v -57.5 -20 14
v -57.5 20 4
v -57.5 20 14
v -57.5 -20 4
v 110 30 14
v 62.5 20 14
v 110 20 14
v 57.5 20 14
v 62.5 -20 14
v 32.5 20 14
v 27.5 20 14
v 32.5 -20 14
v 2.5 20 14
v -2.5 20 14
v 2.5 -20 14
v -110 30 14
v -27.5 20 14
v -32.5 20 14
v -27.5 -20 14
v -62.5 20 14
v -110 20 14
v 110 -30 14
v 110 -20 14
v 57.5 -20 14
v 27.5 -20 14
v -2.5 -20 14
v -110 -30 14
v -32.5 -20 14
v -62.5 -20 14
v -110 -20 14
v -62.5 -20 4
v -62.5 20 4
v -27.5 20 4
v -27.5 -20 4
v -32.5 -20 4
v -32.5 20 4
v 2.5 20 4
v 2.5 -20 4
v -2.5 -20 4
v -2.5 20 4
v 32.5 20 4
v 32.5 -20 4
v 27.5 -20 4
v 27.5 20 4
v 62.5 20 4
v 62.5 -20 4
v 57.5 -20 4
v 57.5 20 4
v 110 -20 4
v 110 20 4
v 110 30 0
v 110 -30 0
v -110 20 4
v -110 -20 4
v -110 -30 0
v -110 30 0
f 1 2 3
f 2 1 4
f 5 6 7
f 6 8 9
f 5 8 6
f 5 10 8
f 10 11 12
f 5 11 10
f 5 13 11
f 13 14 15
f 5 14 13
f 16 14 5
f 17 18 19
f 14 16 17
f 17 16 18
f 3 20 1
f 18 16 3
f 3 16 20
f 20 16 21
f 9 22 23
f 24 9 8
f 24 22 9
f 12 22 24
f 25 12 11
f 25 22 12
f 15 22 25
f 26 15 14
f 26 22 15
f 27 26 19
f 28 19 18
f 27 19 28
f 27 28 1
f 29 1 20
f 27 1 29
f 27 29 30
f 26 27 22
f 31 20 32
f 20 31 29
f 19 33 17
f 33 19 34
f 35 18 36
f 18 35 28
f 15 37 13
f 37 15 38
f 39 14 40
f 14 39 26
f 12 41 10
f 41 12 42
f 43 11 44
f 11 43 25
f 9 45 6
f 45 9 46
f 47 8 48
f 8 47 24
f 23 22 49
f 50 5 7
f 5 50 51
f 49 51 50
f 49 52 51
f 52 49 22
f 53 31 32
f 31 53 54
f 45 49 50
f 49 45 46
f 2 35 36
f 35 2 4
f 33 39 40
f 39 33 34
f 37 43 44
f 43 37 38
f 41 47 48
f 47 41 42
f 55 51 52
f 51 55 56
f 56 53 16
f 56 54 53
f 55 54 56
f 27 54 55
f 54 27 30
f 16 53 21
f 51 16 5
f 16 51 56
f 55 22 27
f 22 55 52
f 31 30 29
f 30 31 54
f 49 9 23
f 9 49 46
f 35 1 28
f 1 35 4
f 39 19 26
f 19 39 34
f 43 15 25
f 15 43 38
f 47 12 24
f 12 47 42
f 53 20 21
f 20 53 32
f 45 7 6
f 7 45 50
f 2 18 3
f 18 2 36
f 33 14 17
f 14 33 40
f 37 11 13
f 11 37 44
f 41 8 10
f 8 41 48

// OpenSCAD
$fn = 32;

// ----------------------------------------------------------------------
// Rib frame 220 x 60 x 14
// 5 ribs at 30 mm pitch
// ----------------------------------------------------------------------

// --- parameters (mm) ---
frame = [220, 60, 4];  // base plate size (x, y, z)
rail_w = 10;           // side rail width
ribs = 5;              // number of ribs
rib_t = 5;             // rib thickness
rib_h = 10;            // rib height above the base plate
pitch = 30;            // pitch between rib centres

// --- derived feature positions (mm) ---
span = (ribs - 1) * pitch;          // = 120   distance between the outer ribs
origin_x = -span / 2;               // = -60   X of the first rib
rib_len = frame[1] - 2 * rail_w + 2;  // = 42   rib length, 1 mm into each rail
feature_centers = [
  [origin_x + 0 * pitch, 0],
  [origin_x + 1 * pitch, 0],
  [origin_x + 2 * pitch, 0],
  [origin_x + 3 * pitch, 0],
  [origin_x + 4 * pitch, 0]
];   // rib centre line, drives the rib loop

// base plate, two side rails, then the ribs read straight off feature_centers
union() {
  translate([-frame[0] / 2, -frame[1] / 2, 0]) cube(frame);
  translate([-frame[0] / 2, -frame[1] / 2, 0]) cube([frame[0], rail_w, frame[2] + rib_h]);
  translate([-frame[0] / 2, frame[1] / 2 - rail_w, 0]) cube([frame[0], rail_w, frame[2] + rib_h]);
  for (centre = feature_centers)
    translate([centre[0] - rib_t / 2, centre[1] - rib_len / 2, frame[2] - 1])
      cube([rib_t, rib_len, rib_h + 1]);
}
